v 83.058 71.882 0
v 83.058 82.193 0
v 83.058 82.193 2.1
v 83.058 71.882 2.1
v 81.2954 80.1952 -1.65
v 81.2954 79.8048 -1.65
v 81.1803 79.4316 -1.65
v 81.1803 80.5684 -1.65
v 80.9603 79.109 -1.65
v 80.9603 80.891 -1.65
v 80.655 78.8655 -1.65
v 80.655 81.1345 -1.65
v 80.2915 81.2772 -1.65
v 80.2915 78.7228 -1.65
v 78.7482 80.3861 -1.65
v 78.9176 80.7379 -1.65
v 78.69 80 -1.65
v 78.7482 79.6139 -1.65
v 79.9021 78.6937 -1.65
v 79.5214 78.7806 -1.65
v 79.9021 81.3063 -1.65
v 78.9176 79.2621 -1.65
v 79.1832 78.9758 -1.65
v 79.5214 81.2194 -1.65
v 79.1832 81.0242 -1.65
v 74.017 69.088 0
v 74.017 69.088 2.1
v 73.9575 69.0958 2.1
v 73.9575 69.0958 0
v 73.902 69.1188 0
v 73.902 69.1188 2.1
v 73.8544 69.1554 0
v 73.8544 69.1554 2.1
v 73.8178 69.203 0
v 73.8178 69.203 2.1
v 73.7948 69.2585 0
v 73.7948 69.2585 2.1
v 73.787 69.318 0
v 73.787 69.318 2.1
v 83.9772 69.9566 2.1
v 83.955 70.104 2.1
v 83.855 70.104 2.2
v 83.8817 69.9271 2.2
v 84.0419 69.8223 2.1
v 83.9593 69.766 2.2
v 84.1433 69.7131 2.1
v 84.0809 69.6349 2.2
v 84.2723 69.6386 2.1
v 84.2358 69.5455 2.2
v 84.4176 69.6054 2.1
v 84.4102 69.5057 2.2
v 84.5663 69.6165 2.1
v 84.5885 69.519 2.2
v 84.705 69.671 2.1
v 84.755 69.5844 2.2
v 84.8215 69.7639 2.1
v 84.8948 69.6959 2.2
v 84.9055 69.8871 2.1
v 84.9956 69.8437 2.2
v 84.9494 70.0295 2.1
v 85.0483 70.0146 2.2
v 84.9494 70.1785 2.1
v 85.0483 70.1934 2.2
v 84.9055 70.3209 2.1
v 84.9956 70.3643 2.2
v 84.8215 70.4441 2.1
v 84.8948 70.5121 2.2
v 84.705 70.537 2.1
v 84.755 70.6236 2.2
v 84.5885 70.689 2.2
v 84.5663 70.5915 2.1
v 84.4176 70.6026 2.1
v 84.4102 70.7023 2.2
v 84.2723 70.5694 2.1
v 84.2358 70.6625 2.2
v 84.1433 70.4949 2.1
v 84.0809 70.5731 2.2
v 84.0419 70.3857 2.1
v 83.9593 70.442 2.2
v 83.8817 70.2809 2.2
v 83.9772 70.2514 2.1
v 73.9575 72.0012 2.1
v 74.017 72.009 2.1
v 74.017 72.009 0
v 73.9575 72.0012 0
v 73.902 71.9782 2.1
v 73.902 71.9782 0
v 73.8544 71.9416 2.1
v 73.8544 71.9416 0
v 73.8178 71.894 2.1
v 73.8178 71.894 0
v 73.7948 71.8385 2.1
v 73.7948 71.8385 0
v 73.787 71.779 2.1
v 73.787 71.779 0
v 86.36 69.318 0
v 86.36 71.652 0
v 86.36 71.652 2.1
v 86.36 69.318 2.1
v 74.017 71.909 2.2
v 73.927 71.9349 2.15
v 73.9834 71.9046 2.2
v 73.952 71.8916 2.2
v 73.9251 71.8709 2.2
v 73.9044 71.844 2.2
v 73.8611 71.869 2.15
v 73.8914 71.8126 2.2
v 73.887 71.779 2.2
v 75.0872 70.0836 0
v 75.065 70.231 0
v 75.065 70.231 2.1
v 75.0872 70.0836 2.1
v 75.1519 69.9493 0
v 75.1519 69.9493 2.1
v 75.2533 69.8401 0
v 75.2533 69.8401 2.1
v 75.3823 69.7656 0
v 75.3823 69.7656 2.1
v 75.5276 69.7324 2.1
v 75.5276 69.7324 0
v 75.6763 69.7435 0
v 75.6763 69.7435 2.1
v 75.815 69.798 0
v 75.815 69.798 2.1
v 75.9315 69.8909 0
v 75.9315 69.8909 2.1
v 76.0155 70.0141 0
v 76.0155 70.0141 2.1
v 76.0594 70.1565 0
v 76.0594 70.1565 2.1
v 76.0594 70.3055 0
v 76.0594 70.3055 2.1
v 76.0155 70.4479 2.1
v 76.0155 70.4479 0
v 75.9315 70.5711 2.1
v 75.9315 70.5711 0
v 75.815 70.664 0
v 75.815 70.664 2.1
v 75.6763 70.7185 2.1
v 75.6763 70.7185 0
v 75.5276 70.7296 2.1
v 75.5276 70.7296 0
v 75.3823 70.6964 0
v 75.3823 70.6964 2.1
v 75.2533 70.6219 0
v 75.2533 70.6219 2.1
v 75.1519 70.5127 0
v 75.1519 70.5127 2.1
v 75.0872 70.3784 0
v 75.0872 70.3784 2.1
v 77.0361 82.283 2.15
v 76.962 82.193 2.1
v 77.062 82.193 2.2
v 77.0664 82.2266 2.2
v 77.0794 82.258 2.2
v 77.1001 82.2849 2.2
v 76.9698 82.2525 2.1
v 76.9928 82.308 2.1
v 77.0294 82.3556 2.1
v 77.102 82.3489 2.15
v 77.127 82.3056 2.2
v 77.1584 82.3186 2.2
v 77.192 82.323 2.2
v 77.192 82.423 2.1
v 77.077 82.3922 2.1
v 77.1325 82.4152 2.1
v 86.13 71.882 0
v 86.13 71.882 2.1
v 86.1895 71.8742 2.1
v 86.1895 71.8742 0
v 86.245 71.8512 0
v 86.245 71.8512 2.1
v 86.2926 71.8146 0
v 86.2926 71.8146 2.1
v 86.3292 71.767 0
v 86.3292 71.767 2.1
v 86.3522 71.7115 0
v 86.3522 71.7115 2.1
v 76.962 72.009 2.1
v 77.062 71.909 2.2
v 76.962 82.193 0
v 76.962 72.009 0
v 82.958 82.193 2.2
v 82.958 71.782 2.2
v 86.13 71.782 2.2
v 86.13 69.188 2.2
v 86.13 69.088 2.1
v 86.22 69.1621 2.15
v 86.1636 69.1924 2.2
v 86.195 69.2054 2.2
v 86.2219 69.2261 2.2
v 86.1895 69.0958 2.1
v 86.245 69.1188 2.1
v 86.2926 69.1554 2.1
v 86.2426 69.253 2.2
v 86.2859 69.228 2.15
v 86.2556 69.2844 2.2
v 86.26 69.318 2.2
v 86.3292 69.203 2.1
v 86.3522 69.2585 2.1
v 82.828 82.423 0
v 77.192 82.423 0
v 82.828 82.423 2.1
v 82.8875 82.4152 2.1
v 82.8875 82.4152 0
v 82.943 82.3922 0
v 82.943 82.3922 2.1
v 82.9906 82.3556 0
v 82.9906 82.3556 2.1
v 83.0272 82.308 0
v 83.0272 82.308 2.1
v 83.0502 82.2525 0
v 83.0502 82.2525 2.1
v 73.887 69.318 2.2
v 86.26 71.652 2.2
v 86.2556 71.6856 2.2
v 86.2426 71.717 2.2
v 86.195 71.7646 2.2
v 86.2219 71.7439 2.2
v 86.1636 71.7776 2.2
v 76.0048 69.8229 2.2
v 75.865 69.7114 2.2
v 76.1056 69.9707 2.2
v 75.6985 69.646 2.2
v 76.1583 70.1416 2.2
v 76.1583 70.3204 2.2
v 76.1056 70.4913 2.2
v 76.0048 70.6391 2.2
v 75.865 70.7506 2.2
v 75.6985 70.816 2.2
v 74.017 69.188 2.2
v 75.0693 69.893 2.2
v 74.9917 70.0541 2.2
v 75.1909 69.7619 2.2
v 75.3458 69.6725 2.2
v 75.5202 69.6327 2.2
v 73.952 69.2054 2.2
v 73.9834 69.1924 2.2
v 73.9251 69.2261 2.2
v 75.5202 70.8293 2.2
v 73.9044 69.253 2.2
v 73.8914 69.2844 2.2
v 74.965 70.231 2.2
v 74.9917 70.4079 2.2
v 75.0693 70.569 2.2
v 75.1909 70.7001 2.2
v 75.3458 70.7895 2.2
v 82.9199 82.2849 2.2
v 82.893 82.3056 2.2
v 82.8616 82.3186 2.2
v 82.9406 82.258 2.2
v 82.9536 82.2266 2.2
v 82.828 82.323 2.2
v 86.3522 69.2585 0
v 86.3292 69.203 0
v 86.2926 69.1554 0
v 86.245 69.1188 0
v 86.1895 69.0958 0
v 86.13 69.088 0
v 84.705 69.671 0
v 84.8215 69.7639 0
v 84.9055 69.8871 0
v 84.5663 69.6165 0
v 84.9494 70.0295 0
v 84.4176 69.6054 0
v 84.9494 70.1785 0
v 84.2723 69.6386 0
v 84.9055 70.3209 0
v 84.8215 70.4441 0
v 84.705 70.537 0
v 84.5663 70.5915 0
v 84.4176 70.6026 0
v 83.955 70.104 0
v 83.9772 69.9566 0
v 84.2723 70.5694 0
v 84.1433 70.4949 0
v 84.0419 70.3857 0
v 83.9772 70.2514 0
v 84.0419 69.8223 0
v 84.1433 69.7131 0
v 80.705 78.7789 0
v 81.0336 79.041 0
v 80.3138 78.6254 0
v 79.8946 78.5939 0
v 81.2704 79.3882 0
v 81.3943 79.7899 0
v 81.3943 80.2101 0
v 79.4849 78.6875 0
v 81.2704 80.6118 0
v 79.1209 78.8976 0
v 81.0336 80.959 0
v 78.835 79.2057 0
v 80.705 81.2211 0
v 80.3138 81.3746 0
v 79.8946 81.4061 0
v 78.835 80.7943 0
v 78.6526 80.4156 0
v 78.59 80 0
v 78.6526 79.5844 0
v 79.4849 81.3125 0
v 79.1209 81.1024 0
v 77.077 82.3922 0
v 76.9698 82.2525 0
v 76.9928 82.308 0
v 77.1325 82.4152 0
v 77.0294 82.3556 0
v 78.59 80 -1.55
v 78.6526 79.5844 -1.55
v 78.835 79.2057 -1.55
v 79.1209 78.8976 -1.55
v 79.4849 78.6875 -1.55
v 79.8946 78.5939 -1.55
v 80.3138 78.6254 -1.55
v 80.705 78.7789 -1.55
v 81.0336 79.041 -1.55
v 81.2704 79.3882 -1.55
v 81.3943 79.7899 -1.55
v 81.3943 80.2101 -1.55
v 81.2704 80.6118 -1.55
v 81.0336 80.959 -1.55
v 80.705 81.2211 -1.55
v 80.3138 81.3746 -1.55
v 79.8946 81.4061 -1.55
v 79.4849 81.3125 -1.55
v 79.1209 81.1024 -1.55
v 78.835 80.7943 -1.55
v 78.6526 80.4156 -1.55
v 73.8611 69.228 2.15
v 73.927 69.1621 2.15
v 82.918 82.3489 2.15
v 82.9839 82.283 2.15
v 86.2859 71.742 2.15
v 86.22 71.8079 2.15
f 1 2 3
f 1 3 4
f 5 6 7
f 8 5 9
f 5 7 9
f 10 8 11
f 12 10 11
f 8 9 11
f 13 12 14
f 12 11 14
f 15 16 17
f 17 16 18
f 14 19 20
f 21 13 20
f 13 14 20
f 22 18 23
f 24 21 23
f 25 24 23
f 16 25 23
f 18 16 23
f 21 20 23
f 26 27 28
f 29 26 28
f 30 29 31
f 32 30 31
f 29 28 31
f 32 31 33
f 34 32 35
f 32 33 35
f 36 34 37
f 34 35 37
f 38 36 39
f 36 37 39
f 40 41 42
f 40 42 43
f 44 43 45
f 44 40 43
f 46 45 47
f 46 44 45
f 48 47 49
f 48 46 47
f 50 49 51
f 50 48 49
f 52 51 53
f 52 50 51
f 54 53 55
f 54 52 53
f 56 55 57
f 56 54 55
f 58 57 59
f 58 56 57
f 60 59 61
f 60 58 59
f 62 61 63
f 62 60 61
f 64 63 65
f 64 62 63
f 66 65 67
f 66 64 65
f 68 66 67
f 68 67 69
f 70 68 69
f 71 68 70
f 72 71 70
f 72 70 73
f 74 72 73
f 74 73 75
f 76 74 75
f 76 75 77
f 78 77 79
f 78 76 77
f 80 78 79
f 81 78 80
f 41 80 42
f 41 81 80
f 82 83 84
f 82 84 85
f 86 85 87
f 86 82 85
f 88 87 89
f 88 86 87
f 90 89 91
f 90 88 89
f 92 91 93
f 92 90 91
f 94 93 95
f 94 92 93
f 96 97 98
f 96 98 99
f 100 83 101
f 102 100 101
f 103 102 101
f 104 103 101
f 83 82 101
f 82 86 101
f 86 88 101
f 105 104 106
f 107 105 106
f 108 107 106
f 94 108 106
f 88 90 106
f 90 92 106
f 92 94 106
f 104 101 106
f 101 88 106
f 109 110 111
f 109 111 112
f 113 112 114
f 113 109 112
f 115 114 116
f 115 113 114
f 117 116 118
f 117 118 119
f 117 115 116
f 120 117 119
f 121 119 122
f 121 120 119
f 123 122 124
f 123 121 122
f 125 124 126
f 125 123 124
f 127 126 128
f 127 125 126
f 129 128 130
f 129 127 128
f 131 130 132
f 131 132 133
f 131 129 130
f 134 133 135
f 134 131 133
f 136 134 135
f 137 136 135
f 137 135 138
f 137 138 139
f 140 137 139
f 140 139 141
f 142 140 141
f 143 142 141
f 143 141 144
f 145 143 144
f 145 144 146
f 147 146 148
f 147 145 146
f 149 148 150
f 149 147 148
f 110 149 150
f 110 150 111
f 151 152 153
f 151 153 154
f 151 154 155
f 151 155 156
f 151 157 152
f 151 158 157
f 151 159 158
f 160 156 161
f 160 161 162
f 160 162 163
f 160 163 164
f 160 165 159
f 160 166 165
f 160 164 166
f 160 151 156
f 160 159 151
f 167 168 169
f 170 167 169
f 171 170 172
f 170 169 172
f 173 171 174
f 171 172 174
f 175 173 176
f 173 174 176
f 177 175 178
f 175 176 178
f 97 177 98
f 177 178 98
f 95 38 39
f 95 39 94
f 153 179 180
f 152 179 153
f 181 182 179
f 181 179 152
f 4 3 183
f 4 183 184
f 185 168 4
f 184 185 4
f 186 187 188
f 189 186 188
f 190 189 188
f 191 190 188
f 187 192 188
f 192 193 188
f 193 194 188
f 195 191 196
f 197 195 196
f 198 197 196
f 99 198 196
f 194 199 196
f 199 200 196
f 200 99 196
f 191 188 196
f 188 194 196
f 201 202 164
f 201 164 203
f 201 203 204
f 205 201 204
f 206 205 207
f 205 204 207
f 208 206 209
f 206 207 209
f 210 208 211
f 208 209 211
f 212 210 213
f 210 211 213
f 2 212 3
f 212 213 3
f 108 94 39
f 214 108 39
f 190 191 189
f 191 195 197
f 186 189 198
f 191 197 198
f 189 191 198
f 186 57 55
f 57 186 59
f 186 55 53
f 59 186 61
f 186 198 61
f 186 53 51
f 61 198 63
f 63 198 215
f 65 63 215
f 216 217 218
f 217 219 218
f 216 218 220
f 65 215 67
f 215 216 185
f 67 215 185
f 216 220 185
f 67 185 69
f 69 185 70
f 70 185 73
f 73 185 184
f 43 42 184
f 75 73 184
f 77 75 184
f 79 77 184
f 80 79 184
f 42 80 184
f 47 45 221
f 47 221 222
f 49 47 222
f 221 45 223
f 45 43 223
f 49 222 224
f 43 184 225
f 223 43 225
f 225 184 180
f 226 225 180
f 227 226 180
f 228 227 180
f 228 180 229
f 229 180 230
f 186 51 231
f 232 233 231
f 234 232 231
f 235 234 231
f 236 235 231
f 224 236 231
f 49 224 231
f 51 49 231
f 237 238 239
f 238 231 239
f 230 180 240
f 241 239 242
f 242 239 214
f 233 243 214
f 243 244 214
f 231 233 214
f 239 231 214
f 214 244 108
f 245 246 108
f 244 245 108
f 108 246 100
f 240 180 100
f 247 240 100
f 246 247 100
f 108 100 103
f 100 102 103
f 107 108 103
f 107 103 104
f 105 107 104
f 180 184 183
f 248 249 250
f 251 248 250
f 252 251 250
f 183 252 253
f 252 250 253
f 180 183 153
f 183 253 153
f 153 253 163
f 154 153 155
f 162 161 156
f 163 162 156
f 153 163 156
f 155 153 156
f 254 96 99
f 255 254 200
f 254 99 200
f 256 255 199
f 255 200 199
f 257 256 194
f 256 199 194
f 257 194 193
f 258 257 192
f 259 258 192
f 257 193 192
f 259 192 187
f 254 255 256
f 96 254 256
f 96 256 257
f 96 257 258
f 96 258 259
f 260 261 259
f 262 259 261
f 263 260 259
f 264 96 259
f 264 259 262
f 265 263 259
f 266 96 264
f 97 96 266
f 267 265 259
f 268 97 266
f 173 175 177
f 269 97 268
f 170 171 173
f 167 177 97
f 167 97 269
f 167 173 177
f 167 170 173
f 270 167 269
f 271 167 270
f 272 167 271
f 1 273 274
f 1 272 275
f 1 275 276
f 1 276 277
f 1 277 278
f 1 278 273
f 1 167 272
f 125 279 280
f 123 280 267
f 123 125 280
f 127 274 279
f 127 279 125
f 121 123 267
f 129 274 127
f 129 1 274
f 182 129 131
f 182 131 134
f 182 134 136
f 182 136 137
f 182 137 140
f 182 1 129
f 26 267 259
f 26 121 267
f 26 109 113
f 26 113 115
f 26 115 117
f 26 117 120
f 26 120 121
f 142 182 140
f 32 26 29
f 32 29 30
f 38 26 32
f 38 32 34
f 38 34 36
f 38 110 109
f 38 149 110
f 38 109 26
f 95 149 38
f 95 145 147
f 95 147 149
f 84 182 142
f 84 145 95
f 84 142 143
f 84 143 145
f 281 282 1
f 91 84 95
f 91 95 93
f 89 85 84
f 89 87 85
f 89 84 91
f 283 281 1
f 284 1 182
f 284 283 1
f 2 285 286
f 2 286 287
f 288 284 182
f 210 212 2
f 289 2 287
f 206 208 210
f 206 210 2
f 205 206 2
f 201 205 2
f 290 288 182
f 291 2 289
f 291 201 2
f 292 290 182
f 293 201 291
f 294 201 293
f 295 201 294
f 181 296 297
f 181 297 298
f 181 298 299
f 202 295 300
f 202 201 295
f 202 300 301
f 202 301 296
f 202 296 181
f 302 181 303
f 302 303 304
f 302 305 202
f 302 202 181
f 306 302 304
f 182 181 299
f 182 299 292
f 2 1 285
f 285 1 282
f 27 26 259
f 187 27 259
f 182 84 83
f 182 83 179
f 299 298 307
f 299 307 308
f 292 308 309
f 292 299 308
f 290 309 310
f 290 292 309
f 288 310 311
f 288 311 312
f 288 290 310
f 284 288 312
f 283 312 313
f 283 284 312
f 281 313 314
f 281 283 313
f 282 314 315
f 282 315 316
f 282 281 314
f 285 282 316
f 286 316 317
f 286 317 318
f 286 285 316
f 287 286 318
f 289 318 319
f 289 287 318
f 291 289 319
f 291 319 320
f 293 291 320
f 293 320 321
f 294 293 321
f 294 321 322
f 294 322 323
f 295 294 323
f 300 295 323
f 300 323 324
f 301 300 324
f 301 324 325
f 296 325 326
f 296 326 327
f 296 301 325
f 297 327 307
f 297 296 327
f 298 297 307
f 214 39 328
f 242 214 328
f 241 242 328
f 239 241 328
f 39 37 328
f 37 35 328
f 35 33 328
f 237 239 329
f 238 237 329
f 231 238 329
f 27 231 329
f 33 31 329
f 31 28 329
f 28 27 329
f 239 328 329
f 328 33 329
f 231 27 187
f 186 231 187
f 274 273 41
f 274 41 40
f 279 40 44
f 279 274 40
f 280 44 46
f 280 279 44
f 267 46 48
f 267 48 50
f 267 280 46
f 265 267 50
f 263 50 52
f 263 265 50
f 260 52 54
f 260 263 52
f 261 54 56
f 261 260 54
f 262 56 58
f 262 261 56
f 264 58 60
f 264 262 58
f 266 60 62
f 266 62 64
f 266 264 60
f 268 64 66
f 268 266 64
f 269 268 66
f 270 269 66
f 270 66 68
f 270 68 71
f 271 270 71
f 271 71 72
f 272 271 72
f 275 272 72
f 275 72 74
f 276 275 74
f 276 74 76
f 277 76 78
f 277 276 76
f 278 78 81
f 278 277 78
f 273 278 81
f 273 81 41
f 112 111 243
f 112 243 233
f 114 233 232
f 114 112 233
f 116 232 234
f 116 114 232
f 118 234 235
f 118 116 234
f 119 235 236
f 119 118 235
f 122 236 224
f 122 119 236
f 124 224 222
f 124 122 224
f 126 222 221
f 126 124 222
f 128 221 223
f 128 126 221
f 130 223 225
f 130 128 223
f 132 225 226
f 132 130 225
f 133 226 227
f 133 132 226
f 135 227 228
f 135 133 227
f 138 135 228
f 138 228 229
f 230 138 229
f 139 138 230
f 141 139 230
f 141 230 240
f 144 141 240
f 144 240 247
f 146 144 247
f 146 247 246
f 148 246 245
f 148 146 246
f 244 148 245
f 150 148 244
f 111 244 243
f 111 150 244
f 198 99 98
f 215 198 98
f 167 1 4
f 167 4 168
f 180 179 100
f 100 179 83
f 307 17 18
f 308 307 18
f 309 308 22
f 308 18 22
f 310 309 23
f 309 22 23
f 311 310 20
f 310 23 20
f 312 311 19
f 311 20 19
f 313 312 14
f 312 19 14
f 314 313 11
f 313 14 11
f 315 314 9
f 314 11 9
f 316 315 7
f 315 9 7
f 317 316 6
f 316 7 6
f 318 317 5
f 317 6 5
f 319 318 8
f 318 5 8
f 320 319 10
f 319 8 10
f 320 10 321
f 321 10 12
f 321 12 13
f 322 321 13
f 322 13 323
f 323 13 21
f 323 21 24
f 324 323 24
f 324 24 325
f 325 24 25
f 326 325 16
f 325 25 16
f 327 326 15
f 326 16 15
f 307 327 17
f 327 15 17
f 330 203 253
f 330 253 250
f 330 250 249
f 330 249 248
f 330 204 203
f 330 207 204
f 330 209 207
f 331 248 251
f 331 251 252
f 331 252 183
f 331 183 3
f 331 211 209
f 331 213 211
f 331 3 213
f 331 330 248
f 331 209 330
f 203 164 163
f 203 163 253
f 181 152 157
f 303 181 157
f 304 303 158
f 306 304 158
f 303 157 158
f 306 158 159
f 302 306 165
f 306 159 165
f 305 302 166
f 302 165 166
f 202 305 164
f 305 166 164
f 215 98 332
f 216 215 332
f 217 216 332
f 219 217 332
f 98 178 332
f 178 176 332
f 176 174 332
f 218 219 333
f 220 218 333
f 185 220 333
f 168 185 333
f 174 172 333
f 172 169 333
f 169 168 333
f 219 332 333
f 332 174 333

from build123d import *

# Parameters (mm, degrees)
EXTRUDE_1_DEPTH     = 2.2
FILLET_1_R          = 0.23
SKETCH_4_R          = 1.41
EXTRUDE_2_DEPTH     = 1.65
CHAMFER_1_SIZE      = 0.1
SKETCH_5_R          = 0.5
CUT_EXTRUDE_1_DEPTH = 2.2
CHAMFER_2_SIZE      = 0.1


with BuildPart() as part:
    # 草图2 → 凸台-拉伸1 (new body)
    with BuildSketch(Plane.XY):
        Polygon((73.787, 72.009), (76.962, 72.009), (76.962, 82.423), (83.058, 82.423), (83.058, 71.882), (86.36, 71.882), (86.36, 69.088), (82.804, 69.088), (77.343, 69.088), (73.787, 69.088), align=None)
    extrude(amount=EXTRUDE_1_DEPTH)

    # 圆角1
    fillet_1_edges = [part.edges().sort_by_distance(p)[0] for p in [
        (73.787, 72.009, 1.1),
        (76.962, 82.423, 1.1),
        (83.058, 82.423, 1.1),
        (86.36, 71.882, 1.1),
        (86.36, 69.088, 1.1),
        (73.787, 69.088, 1.1),
    ]]
    fillet(fillet_1_edges, radius=FILLET_1_R)

    # 草图4 → 凸台-拉伸2 (add)
    with BuildSketch(Plane.XY):
        with Locations(Location((80.00000002, 80.00000002, 0), (0, 0, 180))):
            Circle(SKETCH_4_R)
    extrude(amount=-EXTRUDE_2_DEPTH)

    # 倒角1
    chamfer_1_edges = [part.edges().sort_by_distance(p)[0] for p in [
        (83.058, 77.0375, 2.2),
        (80.0735, 69.088, 2.2),
        (73.787, 70.5485, 2.2),
        (75.4895, 72.009, 2.2),
        (86.36, 70.485, 2.2),
        (84.594, 71.882, 2.2),
        (80.01, 82.423, 2.2),
        (76.962, 77.101, 2.2),
        (86.29263456, 71.81463456, 2.2),
        (86.29263456, 69.15536544, 2.2),
        (82.99063456, 82.35563456, 2.2),
        (77.02936544, 82.35563456, 2.2),
        (73.85436544, 71.94163456, 2.2),
        (73.85436544, 69.15536544, 2.2),
        (81.41000002, 80.00000002, -1.65),
    ]]
    chamfer(chamfer_1_edges, length=CHAMFER_1_SIZE)

    # 草图5 → 切除-拉伸1 (cut)
    with BuildSketch(Plane.XY):
        with Locations(Location((75.565, 70.231, 0), (0, 0, 180))):
            Circle(SKETCH_5_R)
        with Locations(Location((84.455, 70.104, 0), (0, 0, 180))):
            Circle(SKETCH_5_R)
    extrude(amount=CUT_EXTRUDE_1_DEPTH, mode=Mode.SUBTRACT)

    # 倒角2
    chamfer_2_edges = [part.edges().sort_by_distance(p)[0] for p in [
        (76.065, 70.231, 2.2),
        (84.955, 70.104, 2.2),
    ]]
    chamfer(chamfer_2_edges, length=CHAMFER_2_SIZE)


solid = part.part
